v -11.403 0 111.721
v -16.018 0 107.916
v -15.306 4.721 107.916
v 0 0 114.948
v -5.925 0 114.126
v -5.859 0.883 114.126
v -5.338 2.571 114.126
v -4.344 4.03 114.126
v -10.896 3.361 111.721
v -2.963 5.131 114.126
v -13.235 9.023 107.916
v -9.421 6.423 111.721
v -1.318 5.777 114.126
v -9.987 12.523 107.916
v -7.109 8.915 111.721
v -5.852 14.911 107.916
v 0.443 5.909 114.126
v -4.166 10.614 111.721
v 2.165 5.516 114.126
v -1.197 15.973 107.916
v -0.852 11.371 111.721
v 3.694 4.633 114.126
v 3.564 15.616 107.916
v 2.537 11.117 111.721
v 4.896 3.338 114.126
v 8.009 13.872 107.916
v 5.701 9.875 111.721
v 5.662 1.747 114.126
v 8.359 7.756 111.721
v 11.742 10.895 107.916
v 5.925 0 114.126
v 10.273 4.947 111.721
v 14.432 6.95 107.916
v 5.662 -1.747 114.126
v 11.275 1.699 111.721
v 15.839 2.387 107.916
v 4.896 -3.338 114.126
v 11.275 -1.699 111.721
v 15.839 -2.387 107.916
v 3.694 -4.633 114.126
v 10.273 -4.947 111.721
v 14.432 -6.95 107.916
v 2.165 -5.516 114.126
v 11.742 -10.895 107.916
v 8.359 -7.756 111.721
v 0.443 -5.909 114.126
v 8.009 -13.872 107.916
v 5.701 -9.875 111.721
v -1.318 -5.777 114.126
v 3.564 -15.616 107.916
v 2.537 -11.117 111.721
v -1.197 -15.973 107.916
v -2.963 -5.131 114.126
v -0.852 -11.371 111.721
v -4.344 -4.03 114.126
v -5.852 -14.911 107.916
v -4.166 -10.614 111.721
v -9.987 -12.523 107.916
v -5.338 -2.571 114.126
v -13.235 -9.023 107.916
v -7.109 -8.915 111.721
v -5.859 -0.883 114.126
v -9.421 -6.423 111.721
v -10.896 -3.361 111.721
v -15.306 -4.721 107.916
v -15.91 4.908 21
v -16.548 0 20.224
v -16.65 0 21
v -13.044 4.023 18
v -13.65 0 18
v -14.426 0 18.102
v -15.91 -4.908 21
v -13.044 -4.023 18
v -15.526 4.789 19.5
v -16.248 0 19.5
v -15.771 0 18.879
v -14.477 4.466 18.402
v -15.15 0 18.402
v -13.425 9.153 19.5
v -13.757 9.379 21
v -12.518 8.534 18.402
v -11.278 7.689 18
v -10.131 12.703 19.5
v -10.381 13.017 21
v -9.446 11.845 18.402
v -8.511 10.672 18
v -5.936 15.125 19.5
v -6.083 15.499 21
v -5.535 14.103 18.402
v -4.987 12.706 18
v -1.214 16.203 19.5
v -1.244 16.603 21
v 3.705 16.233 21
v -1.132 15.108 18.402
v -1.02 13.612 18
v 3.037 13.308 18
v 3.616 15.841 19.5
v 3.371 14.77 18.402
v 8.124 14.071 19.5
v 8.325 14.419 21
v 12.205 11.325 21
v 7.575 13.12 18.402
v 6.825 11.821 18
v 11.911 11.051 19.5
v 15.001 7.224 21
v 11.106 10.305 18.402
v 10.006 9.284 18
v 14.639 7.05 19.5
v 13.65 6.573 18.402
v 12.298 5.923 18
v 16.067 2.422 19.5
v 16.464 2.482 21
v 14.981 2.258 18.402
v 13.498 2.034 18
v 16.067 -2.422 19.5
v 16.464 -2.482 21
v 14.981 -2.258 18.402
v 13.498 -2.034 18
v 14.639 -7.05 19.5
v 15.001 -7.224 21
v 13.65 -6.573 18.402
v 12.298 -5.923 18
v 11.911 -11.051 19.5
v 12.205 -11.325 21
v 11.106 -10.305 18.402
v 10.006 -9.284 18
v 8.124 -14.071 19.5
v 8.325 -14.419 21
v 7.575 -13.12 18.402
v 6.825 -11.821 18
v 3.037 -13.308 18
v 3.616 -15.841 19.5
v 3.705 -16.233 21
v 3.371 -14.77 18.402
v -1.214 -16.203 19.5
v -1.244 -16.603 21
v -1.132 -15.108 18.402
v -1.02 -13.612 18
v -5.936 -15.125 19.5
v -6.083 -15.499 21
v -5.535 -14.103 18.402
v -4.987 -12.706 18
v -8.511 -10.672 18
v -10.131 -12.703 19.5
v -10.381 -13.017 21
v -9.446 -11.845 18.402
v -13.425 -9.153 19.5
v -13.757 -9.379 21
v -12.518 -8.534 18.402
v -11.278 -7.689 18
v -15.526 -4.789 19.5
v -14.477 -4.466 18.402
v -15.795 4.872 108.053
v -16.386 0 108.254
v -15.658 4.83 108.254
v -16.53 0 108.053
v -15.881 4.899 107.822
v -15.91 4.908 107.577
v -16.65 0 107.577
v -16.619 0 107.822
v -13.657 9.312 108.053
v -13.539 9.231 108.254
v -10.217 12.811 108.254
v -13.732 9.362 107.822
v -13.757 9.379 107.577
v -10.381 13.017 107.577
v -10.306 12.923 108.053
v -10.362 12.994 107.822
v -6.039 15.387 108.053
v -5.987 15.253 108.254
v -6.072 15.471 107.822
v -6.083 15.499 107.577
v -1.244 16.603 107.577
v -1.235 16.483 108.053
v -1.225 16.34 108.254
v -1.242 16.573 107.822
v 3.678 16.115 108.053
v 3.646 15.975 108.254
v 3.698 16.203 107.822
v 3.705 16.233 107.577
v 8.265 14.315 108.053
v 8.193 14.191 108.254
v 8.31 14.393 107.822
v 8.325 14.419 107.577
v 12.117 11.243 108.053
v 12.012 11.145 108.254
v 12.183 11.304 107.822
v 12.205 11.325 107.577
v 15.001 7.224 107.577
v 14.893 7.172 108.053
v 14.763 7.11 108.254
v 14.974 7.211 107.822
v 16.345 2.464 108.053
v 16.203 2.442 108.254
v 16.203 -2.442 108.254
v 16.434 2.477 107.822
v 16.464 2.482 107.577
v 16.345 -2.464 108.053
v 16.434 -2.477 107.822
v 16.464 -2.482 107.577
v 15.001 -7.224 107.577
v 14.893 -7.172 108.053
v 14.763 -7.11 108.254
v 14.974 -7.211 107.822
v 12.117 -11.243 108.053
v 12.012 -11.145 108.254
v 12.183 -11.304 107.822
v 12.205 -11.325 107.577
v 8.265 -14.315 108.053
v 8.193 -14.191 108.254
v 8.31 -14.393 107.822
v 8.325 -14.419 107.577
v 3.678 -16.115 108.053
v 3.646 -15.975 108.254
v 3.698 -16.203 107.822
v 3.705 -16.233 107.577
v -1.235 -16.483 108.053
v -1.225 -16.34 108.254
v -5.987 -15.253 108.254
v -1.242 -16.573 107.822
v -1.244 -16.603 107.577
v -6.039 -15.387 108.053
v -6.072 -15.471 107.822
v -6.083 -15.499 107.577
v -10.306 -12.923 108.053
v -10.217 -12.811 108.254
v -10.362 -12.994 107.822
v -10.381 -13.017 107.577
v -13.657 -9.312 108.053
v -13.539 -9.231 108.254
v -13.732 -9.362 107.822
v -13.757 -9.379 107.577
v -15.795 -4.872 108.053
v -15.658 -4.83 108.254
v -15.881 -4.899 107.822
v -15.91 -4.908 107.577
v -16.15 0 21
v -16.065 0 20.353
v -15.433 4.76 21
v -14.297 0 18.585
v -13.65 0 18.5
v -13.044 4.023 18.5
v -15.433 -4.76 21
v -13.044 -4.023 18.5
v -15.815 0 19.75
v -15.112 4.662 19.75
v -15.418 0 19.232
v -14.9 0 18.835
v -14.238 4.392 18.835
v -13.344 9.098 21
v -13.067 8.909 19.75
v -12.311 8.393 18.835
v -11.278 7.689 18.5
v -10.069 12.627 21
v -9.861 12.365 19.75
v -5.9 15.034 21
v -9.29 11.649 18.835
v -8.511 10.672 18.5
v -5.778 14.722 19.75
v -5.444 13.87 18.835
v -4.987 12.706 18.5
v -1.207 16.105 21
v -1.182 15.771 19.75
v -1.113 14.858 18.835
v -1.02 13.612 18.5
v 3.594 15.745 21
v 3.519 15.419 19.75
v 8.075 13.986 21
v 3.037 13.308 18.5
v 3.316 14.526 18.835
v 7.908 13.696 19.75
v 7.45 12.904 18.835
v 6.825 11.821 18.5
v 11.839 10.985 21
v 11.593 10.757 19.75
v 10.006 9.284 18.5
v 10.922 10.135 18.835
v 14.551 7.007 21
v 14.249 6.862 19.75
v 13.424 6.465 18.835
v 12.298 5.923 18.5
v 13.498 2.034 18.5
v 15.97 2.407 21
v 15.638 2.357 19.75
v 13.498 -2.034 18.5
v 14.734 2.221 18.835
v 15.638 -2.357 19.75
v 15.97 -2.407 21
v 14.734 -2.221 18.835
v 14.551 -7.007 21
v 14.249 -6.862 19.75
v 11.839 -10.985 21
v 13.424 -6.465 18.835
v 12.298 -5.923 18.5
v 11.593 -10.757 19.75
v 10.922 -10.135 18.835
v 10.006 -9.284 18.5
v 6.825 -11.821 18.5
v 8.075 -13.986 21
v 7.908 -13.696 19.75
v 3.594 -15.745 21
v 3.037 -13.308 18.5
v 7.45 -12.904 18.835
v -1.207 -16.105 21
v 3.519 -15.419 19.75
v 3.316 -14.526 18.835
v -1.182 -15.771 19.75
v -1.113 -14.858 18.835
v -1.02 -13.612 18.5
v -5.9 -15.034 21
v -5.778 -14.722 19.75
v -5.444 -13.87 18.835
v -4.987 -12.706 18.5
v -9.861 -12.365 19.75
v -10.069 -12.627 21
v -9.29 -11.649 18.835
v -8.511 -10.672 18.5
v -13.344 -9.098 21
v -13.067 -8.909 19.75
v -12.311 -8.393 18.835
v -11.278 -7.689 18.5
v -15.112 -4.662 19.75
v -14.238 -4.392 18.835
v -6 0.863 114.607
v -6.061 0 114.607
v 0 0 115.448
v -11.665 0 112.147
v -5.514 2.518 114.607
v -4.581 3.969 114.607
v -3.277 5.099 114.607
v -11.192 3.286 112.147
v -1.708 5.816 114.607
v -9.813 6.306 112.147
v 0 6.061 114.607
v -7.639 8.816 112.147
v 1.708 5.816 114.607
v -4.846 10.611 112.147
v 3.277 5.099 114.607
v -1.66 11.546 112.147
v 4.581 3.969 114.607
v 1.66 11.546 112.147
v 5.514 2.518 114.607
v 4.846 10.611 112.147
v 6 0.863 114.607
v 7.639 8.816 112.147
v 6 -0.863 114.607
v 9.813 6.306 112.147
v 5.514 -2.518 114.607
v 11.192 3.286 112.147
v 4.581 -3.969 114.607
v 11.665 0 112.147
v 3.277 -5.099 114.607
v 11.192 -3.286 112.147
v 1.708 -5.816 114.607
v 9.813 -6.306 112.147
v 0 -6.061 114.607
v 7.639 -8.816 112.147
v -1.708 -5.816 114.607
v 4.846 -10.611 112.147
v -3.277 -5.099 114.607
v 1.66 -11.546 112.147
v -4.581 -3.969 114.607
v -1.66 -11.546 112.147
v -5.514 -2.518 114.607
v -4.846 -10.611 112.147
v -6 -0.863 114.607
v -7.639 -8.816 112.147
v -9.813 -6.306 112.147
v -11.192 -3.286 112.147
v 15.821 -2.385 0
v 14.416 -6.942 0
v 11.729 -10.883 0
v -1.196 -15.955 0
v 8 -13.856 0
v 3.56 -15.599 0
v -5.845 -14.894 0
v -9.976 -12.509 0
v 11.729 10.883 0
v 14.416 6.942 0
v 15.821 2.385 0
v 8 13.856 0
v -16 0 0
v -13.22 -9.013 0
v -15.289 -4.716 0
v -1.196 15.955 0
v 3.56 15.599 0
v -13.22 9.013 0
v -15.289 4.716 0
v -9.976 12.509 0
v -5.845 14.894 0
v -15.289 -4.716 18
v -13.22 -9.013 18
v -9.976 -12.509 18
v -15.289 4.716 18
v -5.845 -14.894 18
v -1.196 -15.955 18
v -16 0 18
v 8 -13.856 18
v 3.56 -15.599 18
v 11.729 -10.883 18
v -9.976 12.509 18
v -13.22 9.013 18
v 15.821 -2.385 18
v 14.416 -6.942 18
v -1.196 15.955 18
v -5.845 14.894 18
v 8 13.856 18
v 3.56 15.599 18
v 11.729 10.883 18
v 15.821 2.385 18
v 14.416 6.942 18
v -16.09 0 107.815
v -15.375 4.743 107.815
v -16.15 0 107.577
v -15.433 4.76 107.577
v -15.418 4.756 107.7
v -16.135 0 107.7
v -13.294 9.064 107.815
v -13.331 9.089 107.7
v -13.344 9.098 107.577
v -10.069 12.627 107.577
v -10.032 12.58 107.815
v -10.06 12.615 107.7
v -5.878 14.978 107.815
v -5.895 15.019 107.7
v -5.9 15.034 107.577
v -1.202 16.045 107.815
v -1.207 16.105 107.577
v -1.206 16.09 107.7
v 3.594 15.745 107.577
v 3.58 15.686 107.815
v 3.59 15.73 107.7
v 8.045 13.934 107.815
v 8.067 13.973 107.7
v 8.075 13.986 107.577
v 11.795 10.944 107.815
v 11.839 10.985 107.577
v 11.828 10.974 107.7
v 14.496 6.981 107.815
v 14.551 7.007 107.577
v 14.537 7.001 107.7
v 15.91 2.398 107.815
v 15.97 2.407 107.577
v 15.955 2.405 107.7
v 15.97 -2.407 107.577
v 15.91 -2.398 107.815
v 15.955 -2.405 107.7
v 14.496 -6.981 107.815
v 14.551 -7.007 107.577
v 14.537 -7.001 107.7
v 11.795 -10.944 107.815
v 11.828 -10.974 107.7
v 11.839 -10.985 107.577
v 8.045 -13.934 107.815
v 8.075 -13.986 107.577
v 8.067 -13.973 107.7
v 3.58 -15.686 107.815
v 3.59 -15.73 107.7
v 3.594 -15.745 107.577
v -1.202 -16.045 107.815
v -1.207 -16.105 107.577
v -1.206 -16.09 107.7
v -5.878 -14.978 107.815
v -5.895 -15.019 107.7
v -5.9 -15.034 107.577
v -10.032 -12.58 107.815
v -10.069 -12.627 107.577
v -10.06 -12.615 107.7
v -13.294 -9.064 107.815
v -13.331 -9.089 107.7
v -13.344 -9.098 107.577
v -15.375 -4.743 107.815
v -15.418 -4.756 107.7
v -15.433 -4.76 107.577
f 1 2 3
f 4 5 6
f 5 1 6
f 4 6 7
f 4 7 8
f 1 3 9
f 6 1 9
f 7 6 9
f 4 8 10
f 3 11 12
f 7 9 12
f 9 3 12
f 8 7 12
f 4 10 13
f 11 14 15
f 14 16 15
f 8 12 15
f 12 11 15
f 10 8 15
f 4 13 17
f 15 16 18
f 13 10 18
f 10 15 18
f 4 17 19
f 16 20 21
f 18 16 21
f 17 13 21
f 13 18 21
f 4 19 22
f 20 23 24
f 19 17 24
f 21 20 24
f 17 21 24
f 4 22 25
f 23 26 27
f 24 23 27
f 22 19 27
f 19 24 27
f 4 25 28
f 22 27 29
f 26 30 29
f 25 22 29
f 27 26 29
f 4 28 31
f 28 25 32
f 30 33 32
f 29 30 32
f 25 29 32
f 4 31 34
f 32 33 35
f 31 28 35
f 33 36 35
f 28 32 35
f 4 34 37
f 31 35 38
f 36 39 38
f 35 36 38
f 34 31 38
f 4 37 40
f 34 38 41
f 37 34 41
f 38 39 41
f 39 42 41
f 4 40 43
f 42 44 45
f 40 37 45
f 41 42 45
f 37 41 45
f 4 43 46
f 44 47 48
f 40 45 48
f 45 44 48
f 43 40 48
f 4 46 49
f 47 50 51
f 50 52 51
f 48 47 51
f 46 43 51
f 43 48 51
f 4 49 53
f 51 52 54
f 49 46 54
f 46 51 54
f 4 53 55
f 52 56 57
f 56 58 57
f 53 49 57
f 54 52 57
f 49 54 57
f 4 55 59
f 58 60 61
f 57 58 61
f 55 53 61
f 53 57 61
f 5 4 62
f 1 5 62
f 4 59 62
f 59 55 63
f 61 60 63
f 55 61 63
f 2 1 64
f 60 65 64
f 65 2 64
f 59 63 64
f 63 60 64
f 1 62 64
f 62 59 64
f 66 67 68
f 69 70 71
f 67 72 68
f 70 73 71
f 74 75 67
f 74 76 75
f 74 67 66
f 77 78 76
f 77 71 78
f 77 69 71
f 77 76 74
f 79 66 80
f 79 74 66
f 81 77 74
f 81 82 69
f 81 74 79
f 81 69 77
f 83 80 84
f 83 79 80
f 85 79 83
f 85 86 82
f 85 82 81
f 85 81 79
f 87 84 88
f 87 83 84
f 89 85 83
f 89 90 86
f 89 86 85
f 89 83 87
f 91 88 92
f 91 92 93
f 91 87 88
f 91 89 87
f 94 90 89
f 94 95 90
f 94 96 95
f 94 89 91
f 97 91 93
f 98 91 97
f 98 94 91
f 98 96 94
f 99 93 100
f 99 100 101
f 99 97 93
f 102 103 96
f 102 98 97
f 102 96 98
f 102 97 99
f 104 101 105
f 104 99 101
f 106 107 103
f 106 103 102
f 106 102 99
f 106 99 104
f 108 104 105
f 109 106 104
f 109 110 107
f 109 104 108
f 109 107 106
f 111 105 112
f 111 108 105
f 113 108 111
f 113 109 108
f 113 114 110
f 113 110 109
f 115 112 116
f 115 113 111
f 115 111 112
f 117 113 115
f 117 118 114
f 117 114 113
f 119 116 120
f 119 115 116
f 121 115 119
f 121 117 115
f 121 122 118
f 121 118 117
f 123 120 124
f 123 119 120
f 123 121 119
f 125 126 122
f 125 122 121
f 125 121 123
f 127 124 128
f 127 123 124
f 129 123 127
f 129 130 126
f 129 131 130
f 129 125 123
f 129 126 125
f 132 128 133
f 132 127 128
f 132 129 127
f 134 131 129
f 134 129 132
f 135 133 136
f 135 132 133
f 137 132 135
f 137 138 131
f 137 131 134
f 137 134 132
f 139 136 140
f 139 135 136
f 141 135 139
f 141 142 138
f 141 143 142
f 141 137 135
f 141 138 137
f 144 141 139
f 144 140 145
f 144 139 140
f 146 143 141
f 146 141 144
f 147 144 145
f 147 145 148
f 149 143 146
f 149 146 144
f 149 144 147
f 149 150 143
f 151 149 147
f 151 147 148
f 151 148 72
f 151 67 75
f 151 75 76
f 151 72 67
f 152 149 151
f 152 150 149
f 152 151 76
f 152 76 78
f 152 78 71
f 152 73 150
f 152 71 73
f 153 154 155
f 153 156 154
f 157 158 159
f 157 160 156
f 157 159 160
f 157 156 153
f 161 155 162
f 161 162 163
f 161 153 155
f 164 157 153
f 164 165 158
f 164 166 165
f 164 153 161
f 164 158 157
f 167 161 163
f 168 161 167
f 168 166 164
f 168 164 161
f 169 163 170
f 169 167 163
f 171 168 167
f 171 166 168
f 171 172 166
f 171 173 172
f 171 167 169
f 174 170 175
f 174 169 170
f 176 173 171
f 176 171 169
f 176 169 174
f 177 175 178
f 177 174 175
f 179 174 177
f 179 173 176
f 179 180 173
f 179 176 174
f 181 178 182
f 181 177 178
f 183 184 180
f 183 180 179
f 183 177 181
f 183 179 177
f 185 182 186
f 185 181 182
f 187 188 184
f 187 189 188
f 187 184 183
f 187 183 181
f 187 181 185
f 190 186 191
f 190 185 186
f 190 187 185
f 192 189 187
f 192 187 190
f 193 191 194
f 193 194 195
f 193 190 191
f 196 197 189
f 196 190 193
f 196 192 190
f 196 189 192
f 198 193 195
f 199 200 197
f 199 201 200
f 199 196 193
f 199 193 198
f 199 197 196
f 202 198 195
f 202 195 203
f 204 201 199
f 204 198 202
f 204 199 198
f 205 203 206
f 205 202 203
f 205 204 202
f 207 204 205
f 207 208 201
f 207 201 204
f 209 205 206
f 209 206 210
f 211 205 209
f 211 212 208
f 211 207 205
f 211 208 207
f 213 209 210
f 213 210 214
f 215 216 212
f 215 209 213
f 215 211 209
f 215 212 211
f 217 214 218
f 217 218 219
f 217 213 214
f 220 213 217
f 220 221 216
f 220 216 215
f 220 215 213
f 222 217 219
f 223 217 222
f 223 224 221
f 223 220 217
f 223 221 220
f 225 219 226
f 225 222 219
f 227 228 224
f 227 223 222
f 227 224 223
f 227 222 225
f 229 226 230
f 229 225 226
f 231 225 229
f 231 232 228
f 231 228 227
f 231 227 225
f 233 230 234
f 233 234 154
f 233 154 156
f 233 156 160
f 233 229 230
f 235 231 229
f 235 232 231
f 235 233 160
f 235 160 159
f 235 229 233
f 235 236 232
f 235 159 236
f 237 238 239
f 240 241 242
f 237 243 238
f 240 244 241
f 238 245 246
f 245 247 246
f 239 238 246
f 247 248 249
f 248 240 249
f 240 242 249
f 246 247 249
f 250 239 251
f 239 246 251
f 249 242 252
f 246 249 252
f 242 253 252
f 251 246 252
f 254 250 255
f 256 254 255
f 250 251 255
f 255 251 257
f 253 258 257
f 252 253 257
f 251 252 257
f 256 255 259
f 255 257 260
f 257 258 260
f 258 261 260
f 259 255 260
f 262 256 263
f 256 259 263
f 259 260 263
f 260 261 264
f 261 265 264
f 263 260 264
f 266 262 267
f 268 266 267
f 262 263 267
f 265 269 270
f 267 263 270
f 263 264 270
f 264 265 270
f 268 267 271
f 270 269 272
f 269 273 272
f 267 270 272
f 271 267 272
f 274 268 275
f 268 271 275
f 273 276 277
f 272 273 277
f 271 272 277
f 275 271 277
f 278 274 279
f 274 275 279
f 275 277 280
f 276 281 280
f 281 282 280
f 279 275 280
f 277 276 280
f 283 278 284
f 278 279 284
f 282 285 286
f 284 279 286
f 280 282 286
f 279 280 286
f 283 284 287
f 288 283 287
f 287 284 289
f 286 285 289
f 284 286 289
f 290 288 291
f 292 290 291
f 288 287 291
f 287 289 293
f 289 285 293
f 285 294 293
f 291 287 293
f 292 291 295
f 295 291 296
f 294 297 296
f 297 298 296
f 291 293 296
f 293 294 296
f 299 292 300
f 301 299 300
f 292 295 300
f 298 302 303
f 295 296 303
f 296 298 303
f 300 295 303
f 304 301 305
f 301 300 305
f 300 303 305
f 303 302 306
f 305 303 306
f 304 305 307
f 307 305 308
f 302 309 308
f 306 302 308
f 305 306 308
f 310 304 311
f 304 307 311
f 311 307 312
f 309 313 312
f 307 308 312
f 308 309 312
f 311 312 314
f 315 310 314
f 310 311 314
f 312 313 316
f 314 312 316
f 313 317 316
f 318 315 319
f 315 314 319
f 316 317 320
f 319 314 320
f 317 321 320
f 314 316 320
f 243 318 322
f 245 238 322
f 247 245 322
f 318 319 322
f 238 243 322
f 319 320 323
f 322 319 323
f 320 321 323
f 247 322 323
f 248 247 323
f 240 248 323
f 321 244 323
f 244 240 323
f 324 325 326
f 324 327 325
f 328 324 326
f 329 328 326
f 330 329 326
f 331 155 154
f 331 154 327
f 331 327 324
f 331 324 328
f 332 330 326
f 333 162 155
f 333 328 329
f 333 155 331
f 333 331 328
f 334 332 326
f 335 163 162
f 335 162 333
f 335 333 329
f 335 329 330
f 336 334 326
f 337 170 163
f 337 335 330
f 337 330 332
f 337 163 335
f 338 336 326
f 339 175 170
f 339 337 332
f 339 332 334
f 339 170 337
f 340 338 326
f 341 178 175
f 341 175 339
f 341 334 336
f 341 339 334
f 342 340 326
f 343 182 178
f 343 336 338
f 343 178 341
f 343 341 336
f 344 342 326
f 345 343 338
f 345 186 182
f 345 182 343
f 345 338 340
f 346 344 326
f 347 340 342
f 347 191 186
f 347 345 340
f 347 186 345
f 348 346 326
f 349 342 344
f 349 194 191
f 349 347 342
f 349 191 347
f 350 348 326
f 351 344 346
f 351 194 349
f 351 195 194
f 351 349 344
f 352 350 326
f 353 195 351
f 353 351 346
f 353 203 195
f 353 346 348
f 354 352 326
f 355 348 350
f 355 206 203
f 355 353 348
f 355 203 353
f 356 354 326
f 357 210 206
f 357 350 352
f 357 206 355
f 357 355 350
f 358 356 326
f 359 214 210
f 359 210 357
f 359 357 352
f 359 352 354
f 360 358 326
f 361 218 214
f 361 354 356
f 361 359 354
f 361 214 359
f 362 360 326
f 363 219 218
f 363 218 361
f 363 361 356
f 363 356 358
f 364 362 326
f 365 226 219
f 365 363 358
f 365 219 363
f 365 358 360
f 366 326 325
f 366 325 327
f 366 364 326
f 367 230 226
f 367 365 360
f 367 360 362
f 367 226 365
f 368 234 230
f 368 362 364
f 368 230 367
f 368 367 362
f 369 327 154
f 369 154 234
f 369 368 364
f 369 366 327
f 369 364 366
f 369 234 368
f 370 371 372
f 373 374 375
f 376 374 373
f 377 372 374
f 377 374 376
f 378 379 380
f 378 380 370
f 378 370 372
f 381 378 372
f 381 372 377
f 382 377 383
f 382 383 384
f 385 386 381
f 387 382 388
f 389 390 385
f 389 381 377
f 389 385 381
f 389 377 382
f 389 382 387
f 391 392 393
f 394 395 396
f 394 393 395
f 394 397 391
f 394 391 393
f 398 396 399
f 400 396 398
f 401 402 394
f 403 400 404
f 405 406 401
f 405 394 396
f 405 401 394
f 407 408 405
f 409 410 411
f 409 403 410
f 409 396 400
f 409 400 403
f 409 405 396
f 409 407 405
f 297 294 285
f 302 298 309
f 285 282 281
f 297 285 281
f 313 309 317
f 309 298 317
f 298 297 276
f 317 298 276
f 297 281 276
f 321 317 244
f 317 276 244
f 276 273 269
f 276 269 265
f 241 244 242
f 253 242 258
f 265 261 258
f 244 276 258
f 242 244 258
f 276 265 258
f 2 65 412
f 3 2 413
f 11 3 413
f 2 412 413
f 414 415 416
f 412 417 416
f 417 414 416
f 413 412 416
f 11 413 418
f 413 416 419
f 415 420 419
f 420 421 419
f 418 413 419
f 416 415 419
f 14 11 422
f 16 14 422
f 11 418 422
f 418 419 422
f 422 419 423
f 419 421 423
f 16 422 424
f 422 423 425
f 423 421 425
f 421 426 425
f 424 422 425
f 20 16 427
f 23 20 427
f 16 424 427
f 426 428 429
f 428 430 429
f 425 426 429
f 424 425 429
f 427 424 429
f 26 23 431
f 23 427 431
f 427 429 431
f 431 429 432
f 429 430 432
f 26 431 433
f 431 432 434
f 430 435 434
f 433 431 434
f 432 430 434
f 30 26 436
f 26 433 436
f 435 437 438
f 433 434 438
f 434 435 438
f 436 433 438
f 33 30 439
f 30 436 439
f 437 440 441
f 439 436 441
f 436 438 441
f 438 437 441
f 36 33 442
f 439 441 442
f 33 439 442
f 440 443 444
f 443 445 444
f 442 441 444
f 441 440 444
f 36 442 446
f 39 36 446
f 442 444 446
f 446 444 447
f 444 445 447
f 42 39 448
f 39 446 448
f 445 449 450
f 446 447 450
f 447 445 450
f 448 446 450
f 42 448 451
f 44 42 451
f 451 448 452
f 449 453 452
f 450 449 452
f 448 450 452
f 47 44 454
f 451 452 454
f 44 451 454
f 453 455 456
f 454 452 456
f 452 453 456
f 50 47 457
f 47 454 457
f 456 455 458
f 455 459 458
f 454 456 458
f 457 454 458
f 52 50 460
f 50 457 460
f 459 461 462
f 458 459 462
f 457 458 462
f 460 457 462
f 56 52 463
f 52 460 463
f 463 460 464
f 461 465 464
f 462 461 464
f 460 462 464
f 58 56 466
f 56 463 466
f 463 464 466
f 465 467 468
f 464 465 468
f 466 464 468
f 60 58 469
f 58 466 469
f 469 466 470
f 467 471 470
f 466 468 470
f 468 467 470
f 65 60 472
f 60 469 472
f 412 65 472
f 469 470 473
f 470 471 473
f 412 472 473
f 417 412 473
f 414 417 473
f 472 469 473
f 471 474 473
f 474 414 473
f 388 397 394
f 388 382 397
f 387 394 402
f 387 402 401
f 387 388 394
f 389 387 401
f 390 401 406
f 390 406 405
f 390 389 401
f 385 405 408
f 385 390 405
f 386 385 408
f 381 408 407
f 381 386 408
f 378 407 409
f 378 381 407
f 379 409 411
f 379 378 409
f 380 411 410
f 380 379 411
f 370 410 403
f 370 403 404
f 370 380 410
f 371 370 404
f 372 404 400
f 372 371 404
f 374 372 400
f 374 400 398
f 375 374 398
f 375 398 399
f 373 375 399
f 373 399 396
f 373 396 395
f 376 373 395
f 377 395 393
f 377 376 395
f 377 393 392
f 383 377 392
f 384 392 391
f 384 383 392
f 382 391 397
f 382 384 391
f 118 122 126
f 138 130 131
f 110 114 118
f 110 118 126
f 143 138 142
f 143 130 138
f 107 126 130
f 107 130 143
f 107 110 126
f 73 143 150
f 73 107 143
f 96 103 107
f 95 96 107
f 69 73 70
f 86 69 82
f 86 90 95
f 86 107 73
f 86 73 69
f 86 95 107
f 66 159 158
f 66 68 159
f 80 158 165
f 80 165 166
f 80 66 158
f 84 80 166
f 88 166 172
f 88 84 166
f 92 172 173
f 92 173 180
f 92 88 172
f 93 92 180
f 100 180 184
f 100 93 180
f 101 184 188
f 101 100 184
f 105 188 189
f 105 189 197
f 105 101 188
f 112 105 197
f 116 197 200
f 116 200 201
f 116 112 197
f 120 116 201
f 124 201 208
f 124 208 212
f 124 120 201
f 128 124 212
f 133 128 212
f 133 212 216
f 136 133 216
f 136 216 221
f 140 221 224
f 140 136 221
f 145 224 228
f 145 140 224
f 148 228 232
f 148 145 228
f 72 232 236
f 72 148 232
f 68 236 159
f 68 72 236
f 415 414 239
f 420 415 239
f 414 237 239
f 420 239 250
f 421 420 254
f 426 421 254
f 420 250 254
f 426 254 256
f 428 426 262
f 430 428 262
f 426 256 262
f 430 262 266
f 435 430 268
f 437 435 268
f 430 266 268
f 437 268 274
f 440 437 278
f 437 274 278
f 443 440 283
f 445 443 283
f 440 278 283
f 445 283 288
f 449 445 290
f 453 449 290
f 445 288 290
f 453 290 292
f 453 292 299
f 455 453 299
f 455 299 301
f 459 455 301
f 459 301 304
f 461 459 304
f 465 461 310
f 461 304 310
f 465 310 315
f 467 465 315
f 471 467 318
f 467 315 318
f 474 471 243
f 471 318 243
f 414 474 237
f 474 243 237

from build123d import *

# Parameters (mm, degrees)
F3_T = -0.5


with BuildPart() as f1:
    # F0 (on Front) → F1 (revolve)
    with BuildSketch(Plane.XZ):
        Polygon((-16, 0), (0, 0), (0, 18), (-13.65, 18), (-16, 18), align=None)
    revolve(axis=Axis((0, 0, 57.7242369889), (0, 0, -1)))


with BuildPart() as f2:
    # F0 (on Front) → F2 (revolve)
    with BuildSketch(Plane.XZ):
        with BuildLine():
            Line((-13.65, 18), (0, 18))
            Line((0, 18), (0, 115.4484739778))
            ThreePointArc((0, 115.4484739778), (-8.9480293889, 113.5706246603), (-16.3862007382, 108.2539381938))
            ThreePointArc((-16.3862007382, 108.2539381938), (-16.5817190398, 107.9403548489), (-16.65, 107.5771749611))
            Line((-16.65, 107.5771749611), (-16.65, 21))
            ThreePointArc((-16.65, 21), (-15.7713203436, 18.8786796564), (-13.65, 18))
        make_face()
    revolve(axis=Axis((0, 0, 57.7242369889), (0, 0, -1)))

    # F3 (hollow: no face is removed)
    offset(amount=F3_T, mode=Mode.SUBTRACT)


solid = Compound([f1.part, f2.part])
